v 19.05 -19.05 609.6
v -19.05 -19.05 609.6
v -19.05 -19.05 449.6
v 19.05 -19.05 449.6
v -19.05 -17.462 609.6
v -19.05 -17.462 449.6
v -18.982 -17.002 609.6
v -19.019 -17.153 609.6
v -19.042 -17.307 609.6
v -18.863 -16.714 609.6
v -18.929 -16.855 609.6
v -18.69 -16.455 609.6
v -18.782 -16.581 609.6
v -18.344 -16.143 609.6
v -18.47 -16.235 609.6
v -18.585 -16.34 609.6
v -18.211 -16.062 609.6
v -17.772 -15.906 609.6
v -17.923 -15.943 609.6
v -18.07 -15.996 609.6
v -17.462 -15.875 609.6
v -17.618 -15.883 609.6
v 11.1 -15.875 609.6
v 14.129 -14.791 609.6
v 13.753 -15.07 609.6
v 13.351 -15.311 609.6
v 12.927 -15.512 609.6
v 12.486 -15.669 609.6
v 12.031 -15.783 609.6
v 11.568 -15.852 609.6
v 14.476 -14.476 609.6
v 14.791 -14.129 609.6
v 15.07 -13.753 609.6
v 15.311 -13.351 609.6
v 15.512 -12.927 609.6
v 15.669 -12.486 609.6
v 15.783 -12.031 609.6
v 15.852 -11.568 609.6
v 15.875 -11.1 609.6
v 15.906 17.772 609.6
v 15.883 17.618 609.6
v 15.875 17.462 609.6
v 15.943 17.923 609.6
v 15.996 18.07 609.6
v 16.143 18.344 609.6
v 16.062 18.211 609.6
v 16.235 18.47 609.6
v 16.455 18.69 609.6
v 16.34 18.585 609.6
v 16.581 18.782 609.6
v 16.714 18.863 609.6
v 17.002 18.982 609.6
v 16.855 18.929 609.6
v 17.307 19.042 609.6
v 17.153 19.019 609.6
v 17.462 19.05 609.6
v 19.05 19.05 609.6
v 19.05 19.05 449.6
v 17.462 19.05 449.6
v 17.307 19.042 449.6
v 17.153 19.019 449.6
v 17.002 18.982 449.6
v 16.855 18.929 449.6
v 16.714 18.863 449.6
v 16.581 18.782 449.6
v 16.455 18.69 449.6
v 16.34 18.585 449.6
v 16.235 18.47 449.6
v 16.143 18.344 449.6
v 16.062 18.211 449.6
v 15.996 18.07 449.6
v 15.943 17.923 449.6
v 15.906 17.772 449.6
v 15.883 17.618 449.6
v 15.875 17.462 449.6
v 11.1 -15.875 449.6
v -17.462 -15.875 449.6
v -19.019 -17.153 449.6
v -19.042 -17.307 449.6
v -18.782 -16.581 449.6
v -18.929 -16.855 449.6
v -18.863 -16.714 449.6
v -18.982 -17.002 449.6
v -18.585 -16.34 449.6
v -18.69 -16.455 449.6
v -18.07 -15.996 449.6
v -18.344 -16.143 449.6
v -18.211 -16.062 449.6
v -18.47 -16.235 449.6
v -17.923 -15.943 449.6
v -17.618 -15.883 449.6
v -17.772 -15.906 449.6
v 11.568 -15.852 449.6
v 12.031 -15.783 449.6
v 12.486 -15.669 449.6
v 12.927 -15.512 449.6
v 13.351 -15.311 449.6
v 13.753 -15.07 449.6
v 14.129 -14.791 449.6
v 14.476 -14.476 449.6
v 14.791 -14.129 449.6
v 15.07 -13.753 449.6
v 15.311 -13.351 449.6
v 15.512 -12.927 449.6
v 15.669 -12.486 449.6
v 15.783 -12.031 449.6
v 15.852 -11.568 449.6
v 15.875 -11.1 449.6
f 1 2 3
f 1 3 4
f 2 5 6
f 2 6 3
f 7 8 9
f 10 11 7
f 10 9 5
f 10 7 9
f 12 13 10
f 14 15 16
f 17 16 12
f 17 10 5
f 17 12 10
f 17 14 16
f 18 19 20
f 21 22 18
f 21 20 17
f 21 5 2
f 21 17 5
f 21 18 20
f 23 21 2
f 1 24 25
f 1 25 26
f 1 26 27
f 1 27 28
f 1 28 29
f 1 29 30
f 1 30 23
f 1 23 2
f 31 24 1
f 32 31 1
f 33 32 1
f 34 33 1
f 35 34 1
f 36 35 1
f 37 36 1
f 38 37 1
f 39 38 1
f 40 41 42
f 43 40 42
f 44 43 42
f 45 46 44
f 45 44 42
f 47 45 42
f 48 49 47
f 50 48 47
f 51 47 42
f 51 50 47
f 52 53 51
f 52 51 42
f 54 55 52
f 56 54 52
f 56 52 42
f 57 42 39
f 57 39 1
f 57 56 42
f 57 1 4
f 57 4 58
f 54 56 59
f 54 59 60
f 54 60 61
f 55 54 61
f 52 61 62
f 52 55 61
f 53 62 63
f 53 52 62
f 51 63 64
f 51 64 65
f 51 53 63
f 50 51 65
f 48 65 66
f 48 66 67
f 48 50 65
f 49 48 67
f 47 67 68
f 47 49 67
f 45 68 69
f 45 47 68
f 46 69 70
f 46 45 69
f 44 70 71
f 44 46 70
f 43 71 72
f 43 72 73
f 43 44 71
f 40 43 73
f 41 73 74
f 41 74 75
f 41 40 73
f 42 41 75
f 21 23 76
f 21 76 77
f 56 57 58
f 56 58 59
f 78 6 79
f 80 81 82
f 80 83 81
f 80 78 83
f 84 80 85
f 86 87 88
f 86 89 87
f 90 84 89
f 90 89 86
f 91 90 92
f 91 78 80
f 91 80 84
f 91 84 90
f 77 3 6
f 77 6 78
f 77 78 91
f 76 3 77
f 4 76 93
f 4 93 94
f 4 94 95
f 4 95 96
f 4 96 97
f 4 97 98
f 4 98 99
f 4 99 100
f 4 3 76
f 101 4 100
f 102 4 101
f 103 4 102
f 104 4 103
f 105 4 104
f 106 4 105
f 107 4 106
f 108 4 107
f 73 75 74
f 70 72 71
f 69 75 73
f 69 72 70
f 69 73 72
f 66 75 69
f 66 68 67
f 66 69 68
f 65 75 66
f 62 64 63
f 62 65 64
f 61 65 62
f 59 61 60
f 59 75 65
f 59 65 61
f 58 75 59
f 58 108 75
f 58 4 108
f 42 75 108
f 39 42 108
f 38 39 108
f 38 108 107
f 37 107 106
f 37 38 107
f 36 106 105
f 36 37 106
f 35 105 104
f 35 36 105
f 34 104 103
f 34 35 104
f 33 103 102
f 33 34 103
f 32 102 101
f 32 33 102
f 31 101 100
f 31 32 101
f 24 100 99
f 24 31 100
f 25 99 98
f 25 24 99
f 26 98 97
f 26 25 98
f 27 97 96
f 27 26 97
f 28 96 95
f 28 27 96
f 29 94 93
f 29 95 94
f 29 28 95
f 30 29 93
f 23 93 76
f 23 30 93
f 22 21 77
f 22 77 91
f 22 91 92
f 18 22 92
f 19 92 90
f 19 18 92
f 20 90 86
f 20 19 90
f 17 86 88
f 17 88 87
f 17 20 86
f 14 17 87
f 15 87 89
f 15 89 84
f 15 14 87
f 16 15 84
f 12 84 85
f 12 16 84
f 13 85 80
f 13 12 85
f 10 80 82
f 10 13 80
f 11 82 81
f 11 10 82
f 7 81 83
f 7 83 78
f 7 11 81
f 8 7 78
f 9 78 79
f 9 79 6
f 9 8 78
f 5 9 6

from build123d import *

# Parameters (mm, degrees)
BOSS_EXTRUDE1_DEPTH = 609.6
SKETCH3_W           = 635.2
SKETCH3_H           = 38.1
CUT_EXTRUDE1_DEPTH  = 60
SKETCH4_W           = 424
SKETCH4_H           = 38.1
CUT_EXTRUDE2_DEPTH  = 60


with BuildPart() as part:
    # Sketch2 → Boss-Extrude1 (new, symmetric)
    with BuildSketch(Plane.XY):
        with BuildLine():
            Line((-19.05, -19.05), (19.05, -19.05))
            Line((19.05, -19.05), (19.05, 19.05))
            Line((19.05, 19.05), (17.4625, 19.05))
            ThreePointArc((17.4625, 19.05), (16.339967985, 18.585032015), (15.875, 17.4625))
            Line((15.875, 17.4625), (15.875, -11.0998))
            ThreePointArc((15.875, -11.0998), (14.476376302, -14.476376302), (11.0998, -15.875))
            Line((11.0998, -15.875), (-17.4625, -15.875))
            ThreePointArc((-17.4625, -15.875), (-18.585032015, -16.339967985), (-19.05, -17.4625))
            Line((-19.05, -17.4625), (-19.05, -19.05))
        make_face()
    extrude(amount=BOSS_EXTRUDE1_DEPTH, both=True)

    # Sketch3 → Cut-Extrude1 (cut)
    with BuildSketch(Plane(origin=(19.05, 0, 0), x_dir=(0, 0, -1), z_dir=(1, 0, 0))):
        with Locations((292, 0)):
            Rectangle(SKETCH3_W, SKETCH3_H)
    extrude(amount=-CUT_EXTRUDE1_DEPTH, mode=Mode.SUBTRACT)

    # Sketch4 → Cut-Extrude2 (cut)
    with BuildSketch(Plane(origin=(19.05, 0, 0), x_dir=(0, 0, -1), z_dir=(1, 0, 0))):
        with Locations((-237.6, 0)):
            Rectangle(SKETCH4_W, SKETCH4_H)
    extrude(amount=-CUT_EXTRUDE2_DEPTH, mode=Mode.SUBTRACT)


solid = part.part
